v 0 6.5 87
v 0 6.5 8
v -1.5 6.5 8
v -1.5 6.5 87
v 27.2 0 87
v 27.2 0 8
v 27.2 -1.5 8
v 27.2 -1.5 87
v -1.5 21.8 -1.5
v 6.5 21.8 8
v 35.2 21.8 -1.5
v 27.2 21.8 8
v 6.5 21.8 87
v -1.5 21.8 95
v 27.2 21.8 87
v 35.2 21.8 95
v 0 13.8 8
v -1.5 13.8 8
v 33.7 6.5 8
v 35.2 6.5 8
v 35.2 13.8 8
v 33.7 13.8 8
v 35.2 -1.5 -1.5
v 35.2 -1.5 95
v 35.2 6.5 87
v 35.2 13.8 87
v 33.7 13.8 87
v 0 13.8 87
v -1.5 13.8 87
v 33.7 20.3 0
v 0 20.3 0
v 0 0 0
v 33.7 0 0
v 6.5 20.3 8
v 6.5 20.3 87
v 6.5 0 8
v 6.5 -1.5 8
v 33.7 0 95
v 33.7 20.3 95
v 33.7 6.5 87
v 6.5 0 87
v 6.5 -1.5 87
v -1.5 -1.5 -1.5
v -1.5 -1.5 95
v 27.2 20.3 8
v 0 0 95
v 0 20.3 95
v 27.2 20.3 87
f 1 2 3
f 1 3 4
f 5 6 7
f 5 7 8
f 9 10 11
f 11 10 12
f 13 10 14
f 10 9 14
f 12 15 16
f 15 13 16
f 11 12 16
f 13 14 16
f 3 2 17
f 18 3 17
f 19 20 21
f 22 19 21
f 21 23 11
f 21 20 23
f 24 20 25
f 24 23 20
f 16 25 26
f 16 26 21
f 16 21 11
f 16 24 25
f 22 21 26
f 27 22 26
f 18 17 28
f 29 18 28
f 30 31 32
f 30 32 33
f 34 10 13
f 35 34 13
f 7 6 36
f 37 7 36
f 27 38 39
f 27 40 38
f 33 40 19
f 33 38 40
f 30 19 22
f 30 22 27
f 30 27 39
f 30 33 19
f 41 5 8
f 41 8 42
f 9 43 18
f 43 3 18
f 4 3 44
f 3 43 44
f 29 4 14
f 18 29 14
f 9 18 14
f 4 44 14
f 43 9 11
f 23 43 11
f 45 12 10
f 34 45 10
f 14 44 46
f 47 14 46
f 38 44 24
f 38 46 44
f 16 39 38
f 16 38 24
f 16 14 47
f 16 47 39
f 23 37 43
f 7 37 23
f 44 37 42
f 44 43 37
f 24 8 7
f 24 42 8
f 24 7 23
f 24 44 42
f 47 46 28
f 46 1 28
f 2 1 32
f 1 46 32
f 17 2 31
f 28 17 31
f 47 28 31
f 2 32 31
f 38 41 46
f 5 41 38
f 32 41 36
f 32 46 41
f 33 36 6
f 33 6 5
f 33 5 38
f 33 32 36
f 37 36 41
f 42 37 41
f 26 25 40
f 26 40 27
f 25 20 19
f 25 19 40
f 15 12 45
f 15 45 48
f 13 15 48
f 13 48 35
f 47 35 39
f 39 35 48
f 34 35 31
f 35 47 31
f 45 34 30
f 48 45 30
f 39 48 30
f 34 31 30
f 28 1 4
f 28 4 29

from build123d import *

# Parameters (mm, degrees)
F0_W     = 36.7
F0_H     = 23.3
F0_W_2   = 33.7
F0_H_2   = 20.3
F1_DEPTH = 95
F2_W     = 20.7
F2_H     = 79
F3_DEPTH = 23.301
F4_W     = 7.3
F4_H     = 79
F5_DEPTH = 36.701
F6_W     = 36.7
F6_H     = 23.3
F7_DEPTH = 1.5


with BuildPart() as f1:
    # F0 (on Top) → F1 (new body)
    with BuildSketch(Plane.XY):
        with Locations((16.85, 10.15)):
            Rectangle(F0_W, F0_H)
        with Locations((16.85, 10.15)):
            Rectangle(F0_W_2, F0_H_2, mode=Mode.SUBTRACT)
    extrude(amount=F1_DEPTH)

    # F2 (on face) → F3 (cut, through all)
    with BuildSketch(Plane(origin=(0, 21.8, 0), x_dir=(-1, 0, 0), z_dir=(0, 1, 0))):
        with Locations((-16.85, 47.5)):
            Rectangle(F2_W, F2_H)
    extrude(amount=-F3_DEPTH, mode=Mode.SUBTRACT)

    # F4 (on face) → F5 (cut, through all)
    with BuildSketch(Plane.YZ.offset(35.2)):
        with Locations((10.15, 47.5)):
            Rectangle(F4_W, F4_H)
    extrude(amount=-F5_DEPTH, mode=Mode.SUBTRACT)

    # F6 (on Top) → F7 (join)
    with BuildSketch(Plane.XY):
        with Locations((16.85, 10.15)):
            Rectangle(F6_W, F6_H)
    extrude(amount=-F7_DEPTH)


solid = f1.part
